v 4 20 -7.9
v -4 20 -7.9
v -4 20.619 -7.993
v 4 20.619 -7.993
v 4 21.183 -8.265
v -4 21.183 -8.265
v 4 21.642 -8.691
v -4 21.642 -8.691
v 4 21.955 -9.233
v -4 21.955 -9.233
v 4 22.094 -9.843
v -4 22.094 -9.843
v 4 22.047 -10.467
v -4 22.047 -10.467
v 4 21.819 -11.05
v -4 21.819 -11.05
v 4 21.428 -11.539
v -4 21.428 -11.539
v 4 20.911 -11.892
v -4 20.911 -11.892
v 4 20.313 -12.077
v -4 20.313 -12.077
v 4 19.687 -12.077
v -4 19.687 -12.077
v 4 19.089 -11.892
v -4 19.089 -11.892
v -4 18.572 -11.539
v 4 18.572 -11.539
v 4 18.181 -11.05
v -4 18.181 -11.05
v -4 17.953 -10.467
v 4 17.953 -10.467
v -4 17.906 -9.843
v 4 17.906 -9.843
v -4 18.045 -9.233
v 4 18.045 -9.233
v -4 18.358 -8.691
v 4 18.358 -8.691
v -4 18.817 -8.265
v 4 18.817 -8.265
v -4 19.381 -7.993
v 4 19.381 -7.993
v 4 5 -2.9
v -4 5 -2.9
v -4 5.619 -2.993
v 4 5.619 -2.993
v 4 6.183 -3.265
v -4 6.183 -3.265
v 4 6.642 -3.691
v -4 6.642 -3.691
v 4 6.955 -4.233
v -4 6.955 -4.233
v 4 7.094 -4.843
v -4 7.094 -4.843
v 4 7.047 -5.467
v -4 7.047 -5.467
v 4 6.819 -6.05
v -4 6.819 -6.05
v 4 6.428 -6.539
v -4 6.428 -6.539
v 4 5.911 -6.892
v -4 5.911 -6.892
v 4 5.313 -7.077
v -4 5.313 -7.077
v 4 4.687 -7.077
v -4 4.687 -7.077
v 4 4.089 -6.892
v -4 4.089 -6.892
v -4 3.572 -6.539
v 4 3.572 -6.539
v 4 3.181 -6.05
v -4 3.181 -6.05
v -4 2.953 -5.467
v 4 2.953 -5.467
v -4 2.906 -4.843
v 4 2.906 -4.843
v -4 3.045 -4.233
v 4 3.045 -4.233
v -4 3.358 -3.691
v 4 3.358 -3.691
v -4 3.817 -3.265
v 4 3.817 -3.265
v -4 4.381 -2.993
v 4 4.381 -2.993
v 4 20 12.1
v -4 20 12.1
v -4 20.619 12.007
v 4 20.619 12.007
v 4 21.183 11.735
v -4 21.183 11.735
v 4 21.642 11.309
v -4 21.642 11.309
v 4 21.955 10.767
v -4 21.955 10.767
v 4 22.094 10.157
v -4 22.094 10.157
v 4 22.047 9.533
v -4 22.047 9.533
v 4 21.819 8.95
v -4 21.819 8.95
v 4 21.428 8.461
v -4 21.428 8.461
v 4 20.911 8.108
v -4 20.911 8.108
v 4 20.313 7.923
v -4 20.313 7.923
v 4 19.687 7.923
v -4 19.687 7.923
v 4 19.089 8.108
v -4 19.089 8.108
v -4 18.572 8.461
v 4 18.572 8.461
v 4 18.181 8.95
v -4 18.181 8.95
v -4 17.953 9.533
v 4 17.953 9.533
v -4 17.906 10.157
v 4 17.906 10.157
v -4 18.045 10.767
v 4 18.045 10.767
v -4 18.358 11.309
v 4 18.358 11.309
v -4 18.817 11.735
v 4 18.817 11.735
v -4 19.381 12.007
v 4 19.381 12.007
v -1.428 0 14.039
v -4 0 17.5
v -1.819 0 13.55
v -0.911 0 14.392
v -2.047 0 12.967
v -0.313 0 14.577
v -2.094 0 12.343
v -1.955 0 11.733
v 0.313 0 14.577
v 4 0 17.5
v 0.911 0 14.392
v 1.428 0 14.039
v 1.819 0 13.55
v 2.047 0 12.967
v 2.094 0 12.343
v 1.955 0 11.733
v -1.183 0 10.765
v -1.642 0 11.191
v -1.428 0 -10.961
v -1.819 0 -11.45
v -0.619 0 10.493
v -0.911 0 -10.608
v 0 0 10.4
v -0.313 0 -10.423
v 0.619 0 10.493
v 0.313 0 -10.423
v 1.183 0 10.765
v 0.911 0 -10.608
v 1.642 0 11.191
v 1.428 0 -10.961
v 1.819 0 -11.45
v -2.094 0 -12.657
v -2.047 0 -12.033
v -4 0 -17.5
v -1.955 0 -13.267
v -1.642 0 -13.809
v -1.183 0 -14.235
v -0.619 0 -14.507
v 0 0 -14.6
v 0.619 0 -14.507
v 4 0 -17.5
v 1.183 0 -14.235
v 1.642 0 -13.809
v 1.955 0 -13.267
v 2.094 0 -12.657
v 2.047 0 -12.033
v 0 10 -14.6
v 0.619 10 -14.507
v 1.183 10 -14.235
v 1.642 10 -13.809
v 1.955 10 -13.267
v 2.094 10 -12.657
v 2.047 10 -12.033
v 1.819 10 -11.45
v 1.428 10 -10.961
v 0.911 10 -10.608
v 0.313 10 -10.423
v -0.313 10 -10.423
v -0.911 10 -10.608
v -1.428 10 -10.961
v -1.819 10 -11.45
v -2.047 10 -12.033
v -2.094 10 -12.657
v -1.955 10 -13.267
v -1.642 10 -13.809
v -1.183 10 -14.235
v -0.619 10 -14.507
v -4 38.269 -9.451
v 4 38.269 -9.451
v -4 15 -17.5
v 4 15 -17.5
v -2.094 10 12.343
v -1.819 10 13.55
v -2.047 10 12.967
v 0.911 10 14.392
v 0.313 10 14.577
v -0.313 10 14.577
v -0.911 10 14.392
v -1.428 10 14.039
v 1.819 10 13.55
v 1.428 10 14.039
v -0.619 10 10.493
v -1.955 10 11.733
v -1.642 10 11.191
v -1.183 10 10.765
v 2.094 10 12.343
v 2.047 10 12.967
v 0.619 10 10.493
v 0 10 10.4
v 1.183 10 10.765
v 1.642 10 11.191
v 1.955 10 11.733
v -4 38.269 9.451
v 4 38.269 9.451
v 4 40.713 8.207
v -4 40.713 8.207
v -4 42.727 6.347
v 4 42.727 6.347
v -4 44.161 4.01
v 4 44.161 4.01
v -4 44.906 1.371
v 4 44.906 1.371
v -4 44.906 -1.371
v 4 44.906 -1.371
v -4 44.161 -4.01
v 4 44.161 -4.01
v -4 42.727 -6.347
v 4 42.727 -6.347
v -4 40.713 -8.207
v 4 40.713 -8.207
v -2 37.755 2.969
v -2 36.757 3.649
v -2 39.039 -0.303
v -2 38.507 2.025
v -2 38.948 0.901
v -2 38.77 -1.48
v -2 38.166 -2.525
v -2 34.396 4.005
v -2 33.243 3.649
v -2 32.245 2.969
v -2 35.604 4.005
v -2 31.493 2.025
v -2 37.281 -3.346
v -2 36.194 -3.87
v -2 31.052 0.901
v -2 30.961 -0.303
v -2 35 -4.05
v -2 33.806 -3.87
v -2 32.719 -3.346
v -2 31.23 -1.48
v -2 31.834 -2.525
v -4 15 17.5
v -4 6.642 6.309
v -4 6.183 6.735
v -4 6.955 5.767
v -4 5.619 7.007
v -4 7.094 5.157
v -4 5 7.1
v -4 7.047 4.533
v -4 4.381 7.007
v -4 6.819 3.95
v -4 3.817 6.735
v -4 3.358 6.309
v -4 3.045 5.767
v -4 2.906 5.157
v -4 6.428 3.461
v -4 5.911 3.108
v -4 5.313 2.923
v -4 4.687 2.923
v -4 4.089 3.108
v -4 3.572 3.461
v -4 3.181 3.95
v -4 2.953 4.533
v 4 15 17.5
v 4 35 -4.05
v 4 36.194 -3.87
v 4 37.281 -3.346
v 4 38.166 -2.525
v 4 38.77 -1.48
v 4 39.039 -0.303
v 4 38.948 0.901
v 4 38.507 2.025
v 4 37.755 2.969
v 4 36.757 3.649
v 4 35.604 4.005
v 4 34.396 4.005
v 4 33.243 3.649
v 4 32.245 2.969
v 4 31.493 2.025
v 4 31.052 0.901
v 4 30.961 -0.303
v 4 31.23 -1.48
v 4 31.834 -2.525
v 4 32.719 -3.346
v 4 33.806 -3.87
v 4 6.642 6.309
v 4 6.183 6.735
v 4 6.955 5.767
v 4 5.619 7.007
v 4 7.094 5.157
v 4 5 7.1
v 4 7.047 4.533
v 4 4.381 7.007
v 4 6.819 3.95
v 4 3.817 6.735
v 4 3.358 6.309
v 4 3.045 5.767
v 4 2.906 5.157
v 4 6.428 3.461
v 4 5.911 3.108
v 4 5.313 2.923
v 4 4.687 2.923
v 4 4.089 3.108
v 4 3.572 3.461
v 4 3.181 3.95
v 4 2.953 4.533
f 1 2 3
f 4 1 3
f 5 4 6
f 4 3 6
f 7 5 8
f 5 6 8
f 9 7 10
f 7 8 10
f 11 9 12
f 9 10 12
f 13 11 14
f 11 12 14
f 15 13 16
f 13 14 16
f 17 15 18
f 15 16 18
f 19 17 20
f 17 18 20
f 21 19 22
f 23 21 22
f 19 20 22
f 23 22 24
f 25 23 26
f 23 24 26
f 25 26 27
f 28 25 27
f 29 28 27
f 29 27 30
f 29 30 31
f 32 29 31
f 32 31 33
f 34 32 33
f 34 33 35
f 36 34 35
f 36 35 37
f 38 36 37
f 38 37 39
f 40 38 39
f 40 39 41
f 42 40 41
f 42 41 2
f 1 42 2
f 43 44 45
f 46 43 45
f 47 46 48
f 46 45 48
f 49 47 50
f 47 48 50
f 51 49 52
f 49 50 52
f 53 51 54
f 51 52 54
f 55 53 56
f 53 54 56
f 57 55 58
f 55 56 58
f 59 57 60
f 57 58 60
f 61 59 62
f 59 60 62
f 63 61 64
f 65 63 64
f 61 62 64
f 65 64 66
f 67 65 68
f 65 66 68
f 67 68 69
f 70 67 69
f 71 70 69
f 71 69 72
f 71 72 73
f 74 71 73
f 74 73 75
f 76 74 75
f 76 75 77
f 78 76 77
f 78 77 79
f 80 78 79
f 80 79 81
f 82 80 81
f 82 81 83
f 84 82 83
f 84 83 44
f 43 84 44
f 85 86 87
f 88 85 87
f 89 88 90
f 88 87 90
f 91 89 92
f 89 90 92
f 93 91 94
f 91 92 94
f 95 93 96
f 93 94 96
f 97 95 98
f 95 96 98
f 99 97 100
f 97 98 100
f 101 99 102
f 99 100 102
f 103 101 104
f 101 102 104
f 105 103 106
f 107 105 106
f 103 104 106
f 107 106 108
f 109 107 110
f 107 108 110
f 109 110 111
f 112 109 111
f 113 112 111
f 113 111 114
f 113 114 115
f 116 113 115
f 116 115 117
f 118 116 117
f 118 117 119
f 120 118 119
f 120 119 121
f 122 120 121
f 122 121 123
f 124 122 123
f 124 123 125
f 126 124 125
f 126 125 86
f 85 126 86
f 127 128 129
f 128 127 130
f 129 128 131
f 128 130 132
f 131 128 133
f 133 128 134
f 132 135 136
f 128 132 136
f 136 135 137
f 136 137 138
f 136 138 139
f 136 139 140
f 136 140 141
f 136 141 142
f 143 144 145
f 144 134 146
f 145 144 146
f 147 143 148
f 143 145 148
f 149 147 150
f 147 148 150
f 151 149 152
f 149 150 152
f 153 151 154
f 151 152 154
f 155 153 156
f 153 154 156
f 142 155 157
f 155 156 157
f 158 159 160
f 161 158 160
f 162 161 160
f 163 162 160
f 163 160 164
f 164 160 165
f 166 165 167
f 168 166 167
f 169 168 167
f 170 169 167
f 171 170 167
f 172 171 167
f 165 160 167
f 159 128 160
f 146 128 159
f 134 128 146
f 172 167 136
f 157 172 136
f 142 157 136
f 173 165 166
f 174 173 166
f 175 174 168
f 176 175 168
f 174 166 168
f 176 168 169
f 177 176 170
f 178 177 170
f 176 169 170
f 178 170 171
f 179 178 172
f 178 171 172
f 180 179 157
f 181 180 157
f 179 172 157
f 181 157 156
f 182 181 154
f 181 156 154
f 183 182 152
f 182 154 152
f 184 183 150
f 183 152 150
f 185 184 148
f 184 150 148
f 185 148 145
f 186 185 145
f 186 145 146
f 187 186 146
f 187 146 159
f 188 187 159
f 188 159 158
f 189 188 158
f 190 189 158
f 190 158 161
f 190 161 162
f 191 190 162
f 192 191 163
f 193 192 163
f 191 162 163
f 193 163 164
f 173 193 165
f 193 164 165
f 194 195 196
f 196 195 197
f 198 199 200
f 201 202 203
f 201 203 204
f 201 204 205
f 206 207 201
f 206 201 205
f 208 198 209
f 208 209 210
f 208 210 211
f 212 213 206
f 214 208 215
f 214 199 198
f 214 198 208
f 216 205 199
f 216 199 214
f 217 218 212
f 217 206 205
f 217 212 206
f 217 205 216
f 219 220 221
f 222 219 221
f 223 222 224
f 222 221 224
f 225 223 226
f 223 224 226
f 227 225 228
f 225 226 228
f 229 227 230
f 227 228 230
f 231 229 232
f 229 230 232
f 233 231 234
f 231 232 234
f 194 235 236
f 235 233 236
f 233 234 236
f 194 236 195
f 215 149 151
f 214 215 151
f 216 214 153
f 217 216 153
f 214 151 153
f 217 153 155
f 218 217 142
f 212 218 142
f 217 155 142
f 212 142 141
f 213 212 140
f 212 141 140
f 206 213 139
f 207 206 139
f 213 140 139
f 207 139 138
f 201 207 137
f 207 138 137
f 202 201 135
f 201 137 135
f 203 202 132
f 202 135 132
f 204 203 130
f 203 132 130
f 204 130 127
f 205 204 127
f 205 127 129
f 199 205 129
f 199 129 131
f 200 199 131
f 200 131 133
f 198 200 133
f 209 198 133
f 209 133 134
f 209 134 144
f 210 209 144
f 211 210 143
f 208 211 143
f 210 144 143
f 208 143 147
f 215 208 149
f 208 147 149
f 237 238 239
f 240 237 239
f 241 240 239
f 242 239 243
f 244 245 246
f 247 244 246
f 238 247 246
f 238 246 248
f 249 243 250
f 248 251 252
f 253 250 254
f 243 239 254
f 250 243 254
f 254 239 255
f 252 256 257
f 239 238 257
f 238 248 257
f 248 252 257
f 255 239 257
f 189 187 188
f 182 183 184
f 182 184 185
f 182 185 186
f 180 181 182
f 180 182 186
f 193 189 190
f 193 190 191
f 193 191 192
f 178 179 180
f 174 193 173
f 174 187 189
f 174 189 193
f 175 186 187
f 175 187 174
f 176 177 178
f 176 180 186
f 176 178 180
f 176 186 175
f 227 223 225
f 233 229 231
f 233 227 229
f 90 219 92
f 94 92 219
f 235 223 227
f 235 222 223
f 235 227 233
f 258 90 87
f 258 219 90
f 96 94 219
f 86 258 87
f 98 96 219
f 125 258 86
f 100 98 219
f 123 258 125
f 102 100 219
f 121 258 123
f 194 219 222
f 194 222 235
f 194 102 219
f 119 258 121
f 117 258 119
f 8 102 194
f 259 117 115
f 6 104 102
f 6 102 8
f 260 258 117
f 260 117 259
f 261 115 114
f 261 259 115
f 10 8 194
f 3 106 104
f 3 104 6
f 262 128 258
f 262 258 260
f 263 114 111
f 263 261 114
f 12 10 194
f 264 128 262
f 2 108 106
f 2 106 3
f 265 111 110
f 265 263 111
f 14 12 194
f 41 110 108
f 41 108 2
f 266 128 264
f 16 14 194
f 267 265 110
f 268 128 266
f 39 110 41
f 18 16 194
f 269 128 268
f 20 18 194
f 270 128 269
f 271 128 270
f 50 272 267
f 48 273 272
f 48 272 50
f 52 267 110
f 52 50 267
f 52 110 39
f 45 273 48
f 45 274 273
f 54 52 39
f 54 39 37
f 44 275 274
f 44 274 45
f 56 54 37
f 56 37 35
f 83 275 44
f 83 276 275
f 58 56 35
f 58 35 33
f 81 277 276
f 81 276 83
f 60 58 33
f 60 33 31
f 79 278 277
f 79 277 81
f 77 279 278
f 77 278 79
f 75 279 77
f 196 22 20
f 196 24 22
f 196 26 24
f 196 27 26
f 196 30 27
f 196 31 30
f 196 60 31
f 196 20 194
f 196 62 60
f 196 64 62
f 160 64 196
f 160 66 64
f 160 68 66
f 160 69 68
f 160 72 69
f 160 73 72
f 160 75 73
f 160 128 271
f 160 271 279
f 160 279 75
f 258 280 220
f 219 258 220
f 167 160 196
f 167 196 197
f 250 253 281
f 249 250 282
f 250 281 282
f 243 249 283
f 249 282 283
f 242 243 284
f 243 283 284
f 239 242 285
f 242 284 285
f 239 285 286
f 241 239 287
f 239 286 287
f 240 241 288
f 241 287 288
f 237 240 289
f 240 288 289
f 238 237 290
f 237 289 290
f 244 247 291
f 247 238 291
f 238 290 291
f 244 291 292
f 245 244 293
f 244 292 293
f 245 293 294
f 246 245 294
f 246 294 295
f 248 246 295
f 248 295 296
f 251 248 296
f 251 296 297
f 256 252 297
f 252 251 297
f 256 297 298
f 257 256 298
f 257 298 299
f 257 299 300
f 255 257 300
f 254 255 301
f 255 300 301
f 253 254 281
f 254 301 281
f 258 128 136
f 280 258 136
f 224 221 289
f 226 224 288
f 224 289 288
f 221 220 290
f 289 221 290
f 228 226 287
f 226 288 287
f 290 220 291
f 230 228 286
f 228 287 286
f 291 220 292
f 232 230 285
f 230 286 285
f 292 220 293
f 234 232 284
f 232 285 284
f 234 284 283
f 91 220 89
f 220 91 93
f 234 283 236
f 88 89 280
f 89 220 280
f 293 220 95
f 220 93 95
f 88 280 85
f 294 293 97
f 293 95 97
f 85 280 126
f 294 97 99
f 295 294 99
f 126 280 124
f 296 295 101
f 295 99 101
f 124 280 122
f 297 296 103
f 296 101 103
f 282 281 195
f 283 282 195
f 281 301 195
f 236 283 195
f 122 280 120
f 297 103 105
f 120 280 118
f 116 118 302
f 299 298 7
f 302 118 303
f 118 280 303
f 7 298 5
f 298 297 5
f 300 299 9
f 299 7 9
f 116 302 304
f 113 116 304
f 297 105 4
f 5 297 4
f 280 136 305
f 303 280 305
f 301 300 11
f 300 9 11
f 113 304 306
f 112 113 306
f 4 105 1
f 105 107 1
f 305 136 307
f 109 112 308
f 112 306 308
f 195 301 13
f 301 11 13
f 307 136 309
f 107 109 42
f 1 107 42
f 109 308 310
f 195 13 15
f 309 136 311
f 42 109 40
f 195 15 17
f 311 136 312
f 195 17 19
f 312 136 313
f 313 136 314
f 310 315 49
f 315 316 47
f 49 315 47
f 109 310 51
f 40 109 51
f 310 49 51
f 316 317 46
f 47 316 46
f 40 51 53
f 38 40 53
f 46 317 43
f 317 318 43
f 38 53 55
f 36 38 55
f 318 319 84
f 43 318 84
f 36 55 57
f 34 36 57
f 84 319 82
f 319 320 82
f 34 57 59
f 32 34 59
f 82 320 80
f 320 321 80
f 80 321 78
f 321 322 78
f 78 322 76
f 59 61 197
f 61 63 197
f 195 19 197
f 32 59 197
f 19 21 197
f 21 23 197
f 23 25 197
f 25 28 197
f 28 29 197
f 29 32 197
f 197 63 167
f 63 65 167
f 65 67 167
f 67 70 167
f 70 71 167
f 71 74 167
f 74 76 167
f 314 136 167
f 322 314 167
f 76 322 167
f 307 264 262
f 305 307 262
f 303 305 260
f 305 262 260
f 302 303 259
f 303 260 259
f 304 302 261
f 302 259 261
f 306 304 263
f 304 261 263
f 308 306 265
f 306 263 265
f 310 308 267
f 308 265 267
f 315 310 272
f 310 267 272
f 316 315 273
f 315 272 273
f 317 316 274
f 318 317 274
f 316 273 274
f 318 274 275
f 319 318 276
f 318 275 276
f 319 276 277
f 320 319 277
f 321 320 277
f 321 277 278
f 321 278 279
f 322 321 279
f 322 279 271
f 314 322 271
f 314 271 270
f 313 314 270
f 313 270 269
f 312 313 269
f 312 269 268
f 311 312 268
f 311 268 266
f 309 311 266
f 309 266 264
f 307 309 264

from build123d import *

# Parameters (mm, degrees)
SKETCH_1_W          = 8
SKETCH_1_H          = 35
EXTRUDE_1_DEPTH     = 60
CUT_EXTRUDE_1_DEPTH = 60
SKETCH_3_R          = 2.1
CUT_EXTRUDE_2_DEPTH = 10
SKETCH_4_R          = 4.05
CUT_EXTRUDE_3_DEPTH = 46
SKETCH_5_R          = 2.1
CUT_EXTRUDE_4_DEPTH = 10
SKETCH_7_R          = 4.05
EXTRUDE_2_DEPTH     = 2


with BuildPart() as part:
    # 草图1 → 凸台-拉伸1 (new body)
    with BuildSketch(Plane(origin=(0, 0, 0), x_dir=(1, 0, 0), z_dir=(0, 1, 0))):
        Rectangle(SKETCH_1_W, SKETCH_1_H)
    extrude(amount=EXTRUDE_1_DEPTH)

    # 草图2 → 切除-拉伸1 (cut)
    with BuildSketch(Plane(origin=(4, 0, 0), x_dir=(0, 0, -1), z_dir=(1, 0, 0))):
        with BuildLine():
            Line((-17.5, 15), (-9.450518874, 38.269203727))
            ThreePointArc((-9.450518874, 38.269203727), (-1.17e-07, 45), (9.450518798, 38.269203948))
            Line((9.450518798, 38.269203948), (17.5, 15))
            Line((17.5, 15), (17.5, 60))
            Line((17.5, 60), (-17.5, 60))
            Line((-17.5, 60), (-17.5, 15))
        make_face()
    extrude(amount=-CUT_EXTRUDE_1_DEPTH, mode=Mode.SUBTRACT)

    # 草图3 → 切除-拉伸2 (cut)
    with BuildSketch(Plane.XZ):
        with Locations(Location((0, -12.5, 0), (0, 0, 270))):
            Circle(SKETCH_3_R)
        with Locations(Location((0, 12.5, 0), (0, 0, 270))):
            Circle(SKETCH_3_R)
    extrude(amount=-CUT_EXTRUDE_2_DEPTH, mode=Mode.SUBTRACT)

    # 草图4 → 切除-拉伸3 (cut)
    with BuildSketch(Plane(origin=(4, 0, 0), x_dir=(0, 0, -1), z_dir=(1, 0, 0))):
        with Locations((0, 35)):
            Circle(SKETCH_4_R)
    extrude(amount=-CUT_EXTRUDE_3_DEPTH, mode=Mode.SUBTRACT)

    # 草图5 → 切除-拉伸4 (cut)
    with BuildSketch(Plane.ZY.offset(4)):
        with Locations((10, 20)):
            Circle(SKETCH_5_R)
        with Locations((-10, 20)):
            Circle(SKETCH_5_R)
        with Locations((5, 5)):
            Circle(SKETCH_5_R)
        with Locations((-5, 5)):
            Circle(SKETCH_5_R)
    extrude(amount=-CUT_EXTRUDE_4_DEPTH, mode=Mode.SUBTRACT)


with BuildPart() as body_2:
    # 草图7 → 凸台-拉伸2 (new body)
    with BuildSketch(Plane.ZY.offset(4)):
        with Locations(Location((0, 35, 0), (0, 0, 180))):
            Circle(SKETCH_7_R)
    extrude(amount=-EXTRUDE_2_DEPTH)

    # Combine 3: union part
    add(part.part)


solid = body_2.part
